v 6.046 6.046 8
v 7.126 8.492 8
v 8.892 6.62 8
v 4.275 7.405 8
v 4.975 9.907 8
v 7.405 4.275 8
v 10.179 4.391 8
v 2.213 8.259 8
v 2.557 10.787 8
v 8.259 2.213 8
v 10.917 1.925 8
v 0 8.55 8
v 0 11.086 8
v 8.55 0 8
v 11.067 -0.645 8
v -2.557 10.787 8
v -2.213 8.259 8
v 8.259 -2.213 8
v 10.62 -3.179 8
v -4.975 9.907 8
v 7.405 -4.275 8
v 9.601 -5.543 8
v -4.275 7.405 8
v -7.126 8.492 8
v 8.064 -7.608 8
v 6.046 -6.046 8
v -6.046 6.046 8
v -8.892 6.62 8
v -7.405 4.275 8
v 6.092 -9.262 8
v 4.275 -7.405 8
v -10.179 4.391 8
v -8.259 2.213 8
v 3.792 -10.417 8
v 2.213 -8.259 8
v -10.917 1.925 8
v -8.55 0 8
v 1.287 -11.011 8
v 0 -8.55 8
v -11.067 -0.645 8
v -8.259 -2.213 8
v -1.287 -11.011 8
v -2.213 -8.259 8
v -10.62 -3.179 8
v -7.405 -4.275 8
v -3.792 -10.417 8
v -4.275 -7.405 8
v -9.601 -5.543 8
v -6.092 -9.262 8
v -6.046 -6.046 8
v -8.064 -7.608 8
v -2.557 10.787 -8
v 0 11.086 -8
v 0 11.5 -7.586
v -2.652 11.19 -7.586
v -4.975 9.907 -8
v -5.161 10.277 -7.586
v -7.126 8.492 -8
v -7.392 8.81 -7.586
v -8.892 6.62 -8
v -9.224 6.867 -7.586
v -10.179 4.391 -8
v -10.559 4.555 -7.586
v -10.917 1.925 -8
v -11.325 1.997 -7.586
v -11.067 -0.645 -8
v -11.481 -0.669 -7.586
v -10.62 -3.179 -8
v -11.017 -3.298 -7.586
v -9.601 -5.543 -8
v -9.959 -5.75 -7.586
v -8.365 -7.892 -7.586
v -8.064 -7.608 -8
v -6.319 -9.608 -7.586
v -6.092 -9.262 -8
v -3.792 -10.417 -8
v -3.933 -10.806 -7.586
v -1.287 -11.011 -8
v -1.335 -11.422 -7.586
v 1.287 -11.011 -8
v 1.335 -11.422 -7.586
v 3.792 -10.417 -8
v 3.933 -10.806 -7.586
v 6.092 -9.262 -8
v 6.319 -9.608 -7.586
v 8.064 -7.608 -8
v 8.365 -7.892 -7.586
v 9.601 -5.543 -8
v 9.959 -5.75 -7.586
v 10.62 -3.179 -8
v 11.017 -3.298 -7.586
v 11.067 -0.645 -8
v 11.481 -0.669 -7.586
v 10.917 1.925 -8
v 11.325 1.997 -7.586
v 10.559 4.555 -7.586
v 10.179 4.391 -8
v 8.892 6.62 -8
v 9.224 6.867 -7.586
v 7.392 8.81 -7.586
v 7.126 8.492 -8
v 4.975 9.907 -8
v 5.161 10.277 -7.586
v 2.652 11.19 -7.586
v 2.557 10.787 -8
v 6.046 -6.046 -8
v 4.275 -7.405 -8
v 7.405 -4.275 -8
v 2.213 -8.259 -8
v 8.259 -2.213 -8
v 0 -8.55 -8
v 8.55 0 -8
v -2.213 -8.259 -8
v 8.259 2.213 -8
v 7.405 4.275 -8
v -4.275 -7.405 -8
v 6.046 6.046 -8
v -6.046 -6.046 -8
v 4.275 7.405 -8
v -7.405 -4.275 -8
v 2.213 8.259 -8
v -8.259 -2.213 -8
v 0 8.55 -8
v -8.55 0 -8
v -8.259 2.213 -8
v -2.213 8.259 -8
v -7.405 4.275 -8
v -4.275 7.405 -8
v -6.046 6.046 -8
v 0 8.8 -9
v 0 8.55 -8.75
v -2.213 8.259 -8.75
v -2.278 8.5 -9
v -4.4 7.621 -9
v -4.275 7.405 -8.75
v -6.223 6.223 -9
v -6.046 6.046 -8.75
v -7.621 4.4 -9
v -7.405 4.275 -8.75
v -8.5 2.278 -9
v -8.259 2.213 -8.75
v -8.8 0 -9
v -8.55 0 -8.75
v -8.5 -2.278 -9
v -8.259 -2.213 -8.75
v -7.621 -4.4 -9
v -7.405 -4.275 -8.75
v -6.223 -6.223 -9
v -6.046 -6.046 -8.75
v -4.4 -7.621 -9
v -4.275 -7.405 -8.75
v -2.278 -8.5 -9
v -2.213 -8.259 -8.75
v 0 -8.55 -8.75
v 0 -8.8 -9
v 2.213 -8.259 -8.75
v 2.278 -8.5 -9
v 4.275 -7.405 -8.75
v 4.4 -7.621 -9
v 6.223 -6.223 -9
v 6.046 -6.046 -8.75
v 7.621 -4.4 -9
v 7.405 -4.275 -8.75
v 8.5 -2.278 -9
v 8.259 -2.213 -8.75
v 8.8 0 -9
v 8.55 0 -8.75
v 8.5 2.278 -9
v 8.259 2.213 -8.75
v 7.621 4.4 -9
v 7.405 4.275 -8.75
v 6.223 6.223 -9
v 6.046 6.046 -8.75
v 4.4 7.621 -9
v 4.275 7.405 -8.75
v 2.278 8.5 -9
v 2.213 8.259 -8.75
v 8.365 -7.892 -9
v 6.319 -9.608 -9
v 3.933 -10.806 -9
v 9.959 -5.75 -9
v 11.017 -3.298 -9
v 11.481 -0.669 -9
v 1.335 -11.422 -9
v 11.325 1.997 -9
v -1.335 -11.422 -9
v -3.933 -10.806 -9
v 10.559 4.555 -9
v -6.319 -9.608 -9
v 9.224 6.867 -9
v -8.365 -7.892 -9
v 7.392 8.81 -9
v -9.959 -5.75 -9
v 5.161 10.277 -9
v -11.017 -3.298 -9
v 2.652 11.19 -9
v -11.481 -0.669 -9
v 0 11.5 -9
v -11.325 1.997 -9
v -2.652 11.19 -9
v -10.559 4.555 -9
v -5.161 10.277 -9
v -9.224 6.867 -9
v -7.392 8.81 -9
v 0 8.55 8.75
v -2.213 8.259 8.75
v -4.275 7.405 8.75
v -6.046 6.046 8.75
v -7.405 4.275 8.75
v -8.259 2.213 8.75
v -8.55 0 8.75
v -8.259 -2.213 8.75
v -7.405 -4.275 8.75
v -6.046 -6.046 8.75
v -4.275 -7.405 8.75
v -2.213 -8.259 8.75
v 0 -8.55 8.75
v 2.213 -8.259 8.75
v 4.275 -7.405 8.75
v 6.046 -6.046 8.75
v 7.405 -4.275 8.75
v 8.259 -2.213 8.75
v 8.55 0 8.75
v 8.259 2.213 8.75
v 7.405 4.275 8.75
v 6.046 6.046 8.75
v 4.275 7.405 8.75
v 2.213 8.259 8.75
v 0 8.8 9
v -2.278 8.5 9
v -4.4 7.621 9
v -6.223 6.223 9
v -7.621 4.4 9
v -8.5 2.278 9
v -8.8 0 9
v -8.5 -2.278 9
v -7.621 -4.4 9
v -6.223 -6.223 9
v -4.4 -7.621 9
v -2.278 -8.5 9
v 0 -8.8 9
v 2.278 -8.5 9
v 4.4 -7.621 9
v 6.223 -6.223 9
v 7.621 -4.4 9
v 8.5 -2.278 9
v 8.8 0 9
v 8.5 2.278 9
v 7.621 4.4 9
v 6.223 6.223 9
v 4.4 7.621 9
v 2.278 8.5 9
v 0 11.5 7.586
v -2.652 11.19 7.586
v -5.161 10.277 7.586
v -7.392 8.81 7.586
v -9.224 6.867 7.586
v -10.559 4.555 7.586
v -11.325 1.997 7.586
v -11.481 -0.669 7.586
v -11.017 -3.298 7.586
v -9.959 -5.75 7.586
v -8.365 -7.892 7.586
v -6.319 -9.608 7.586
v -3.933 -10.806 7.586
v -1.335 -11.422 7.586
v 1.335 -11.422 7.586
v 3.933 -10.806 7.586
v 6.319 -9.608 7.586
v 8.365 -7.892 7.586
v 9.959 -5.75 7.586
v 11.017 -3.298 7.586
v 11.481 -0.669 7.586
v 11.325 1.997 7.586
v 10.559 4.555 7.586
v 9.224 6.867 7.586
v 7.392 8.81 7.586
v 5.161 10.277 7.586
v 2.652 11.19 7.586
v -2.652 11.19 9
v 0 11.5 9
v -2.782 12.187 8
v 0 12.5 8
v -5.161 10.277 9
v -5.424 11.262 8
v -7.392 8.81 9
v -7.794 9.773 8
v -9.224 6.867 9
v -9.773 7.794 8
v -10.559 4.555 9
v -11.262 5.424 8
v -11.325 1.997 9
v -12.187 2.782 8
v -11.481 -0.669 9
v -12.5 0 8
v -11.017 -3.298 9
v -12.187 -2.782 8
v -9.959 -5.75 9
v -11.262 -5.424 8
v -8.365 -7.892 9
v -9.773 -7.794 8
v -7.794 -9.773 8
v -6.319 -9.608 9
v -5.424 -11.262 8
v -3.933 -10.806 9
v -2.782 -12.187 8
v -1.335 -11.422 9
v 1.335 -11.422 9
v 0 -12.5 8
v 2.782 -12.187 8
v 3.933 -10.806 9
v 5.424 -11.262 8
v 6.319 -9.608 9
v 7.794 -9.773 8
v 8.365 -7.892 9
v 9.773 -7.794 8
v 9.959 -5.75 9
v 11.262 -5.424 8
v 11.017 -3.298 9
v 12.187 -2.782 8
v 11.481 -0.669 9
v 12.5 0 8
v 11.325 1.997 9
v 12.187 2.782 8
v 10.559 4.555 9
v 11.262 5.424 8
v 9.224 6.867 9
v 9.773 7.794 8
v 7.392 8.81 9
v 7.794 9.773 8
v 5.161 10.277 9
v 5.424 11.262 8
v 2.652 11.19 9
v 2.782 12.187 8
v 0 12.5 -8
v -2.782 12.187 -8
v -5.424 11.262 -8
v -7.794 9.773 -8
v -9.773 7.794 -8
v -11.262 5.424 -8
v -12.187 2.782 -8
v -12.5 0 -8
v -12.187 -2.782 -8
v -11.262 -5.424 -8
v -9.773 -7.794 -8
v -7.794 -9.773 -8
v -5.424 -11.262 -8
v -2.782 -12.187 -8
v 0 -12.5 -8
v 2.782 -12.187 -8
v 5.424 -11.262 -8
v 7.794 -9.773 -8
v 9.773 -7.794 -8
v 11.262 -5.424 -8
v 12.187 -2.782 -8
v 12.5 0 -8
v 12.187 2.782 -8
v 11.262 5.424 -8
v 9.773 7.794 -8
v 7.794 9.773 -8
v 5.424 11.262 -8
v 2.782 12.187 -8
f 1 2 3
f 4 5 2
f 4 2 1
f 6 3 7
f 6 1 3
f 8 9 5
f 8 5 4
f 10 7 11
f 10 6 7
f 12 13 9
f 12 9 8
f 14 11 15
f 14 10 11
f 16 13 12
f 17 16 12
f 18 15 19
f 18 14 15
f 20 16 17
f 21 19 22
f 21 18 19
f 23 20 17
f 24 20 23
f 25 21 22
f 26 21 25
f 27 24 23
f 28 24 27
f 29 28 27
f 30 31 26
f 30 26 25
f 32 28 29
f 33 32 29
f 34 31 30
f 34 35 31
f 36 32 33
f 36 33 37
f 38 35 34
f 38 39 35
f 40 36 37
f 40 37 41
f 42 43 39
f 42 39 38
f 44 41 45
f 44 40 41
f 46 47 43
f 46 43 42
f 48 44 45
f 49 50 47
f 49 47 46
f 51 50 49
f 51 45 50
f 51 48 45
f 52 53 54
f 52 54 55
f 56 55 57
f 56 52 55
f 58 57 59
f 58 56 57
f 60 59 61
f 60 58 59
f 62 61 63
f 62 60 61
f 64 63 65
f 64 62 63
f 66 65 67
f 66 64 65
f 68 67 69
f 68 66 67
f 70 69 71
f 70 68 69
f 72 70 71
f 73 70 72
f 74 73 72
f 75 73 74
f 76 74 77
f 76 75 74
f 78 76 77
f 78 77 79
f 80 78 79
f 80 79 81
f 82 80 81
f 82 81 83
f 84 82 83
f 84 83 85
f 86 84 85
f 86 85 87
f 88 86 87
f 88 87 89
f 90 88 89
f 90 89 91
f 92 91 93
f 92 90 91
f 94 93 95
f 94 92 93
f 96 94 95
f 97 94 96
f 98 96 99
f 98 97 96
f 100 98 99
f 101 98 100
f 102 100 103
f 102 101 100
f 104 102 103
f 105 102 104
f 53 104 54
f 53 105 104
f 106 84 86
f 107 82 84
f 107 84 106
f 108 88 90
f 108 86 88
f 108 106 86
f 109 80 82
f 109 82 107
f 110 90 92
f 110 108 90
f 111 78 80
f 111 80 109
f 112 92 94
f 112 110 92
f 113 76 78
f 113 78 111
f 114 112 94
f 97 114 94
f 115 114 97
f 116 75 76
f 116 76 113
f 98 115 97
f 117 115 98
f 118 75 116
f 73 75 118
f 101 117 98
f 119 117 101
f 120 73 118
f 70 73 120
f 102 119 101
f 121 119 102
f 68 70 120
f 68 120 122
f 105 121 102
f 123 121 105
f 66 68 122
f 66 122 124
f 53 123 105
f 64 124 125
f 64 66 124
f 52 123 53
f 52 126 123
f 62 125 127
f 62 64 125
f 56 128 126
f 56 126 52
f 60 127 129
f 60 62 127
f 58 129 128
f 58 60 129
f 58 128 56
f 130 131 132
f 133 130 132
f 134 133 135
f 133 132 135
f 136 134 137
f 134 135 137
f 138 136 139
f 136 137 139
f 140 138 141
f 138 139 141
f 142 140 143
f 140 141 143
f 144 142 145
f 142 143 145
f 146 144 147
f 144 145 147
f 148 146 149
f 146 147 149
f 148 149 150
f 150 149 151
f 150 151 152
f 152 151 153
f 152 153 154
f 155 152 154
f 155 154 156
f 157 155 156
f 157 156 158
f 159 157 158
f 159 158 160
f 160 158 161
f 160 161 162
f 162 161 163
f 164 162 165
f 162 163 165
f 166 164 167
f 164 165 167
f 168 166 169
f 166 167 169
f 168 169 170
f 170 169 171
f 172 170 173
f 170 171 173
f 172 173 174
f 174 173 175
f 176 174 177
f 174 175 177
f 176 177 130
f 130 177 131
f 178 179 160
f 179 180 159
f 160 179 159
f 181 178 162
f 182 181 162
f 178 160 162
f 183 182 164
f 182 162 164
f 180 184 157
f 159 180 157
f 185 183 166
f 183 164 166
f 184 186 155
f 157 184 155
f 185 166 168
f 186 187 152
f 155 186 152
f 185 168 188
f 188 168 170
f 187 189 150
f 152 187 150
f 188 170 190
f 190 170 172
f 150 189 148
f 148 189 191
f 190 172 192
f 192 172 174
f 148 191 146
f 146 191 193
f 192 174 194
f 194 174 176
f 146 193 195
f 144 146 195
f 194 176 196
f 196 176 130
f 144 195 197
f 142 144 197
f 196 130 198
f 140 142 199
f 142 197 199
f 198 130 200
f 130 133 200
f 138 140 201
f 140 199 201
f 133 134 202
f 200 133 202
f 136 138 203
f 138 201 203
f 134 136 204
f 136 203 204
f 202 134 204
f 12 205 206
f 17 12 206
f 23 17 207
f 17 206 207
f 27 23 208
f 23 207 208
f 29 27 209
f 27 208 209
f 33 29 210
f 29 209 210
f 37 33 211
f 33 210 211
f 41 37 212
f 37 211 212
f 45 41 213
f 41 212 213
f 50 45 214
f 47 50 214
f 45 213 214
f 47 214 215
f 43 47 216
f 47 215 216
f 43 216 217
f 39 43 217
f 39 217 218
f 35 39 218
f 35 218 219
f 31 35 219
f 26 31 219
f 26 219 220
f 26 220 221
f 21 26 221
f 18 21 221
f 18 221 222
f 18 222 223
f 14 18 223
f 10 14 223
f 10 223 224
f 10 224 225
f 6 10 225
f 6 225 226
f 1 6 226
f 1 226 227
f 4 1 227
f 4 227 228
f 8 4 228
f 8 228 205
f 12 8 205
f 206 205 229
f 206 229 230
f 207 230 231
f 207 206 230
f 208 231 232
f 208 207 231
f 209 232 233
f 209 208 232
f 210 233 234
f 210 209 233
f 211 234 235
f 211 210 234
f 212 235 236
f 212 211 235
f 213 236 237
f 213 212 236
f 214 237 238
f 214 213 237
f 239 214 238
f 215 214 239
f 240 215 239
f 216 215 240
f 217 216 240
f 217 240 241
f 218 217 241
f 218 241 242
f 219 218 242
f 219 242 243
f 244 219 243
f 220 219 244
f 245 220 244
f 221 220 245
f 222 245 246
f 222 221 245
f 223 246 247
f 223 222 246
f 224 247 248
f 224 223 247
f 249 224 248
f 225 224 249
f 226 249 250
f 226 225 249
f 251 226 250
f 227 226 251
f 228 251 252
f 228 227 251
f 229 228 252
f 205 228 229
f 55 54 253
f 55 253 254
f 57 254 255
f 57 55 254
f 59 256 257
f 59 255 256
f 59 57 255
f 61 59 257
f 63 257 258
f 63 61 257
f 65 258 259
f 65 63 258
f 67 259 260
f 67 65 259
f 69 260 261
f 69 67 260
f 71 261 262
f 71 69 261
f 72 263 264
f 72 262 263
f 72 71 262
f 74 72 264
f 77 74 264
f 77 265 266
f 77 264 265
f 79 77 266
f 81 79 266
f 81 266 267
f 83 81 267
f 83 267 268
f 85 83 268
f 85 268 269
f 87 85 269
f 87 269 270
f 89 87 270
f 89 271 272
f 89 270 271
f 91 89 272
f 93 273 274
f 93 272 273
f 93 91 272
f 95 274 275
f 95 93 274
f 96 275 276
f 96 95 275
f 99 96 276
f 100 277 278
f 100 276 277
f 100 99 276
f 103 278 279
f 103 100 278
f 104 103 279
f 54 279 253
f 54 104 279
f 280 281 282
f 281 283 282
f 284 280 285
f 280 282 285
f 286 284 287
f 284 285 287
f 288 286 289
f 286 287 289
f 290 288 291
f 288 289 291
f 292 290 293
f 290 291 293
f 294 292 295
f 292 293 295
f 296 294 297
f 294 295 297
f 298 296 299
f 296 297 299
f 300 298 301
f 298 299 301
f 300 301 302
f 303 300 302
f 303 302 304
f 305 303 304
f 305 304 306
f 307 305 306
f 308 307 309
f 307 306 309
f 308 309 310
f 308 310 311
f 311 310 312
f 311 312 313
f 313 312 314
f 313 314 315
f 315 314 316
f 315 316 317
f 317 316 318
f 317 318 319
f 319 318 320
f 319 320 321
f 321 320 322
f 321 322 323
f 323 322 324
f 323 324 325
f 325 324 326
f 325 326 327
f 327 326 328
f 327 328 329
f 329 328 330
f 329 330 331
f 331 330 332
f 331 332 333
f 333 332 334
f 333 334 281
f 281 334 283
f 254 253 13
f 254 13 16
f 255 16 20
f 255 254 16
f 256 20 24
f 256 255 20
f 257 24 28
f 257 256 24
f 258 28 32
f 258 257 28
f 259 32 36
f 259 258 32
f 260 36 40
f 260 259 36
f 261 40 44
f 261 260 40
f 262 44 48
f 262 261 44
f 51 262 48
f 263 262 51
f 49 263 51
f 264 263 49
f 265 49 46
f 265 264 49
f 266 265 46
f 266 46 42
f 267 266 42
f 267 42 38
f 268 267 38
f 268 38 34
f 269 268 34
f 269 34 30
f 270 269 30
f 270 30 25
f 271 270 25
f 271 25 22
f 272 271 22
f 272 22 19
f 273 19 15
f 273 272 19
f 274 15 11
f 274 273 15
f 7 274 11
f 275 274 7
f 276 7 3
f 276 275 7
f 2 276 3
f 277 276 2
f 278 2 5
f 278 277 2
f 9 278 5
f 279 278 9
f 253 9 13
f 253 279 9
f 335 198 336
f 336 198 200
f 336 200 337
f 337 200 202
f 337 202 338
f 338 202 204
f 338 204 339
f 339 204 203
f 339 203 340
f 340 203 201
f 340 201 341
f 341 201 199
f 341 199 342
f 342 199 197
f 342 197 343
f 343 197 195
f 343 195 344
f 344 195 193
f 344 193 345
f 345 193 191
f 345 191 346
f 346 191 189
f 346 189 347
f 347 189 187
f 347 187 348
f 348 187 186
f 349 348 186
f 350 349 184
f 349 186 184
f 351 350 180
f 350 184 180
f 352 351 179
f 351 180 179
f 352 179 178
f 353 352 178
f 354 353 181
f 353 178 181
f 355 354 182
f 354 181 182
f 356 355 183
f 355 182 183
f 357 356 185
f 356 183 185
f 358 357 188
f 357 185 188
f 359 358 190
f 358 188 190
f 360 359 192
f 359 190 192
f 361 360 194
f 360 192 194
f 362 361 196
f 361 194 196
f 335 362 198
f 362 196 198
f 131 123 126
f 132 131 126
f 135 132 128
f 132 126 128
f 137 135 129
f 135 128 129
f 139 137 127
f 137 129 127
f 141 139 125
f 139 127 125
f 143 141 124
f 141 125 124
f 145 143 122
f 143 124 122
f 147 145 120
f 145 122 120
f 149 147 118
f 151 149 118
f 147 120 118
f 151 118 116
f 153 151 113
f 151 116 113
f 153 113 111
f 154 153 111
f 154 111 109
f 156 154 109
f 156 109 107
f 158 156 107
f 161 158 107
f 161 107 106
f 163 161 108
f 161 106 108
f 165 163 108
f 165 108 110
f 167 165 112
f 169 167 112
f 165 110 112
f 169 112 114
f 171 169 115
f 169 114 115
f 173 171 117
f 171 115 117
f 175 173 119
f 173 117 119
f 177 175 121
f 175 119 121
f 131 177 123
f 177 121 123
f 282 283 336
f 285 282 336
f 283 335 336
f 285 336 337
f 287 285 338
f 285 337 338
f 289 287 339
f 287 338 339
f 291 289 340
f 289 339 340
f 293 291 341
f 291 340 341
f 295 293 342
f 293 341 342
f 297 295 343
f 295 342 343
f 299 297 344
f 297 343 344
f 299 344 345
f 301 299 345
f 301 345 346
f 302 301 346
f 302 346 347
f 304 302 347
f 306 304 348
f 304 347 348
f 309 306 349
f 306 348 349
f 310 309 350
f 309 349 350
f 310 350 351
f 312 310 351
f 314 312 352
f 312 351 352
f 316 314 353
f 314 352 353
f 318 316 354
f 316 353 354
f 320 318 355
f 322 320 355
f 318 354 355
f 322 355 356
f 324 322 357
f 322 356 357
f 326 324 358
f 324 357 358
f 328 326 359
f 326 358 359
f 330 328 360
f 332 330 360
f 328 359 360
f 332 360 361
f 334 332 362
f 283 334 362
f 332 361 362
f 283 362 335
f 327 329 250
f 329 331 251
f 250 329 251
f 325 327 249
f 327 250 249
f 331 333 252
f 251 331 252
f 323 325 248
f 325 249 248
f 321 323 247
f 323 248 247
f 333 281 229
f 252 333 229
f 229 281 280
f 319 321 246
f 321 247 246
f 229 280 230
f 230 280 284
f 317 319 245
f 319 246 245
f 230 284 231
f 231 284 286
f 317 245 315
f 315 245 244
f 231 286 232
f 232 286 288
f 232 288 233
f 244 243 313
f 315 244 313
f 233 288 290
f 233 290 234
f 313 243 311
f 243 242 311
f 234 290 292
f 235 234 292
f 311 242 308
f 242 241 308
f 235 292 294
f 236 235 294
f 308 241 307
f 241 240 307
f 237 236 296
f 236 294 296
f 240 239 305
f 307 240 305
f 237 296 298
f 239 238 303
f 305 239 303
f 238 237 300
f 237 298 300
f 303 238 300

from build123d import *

# Parameters (mm, degrees)
SPESSORE1_T1 = 1
SMUSSO1_SIZE = 0.25


with BuildPart() as body_1:
    # Superficie-Rivoluzione1: a surface, the sketch's curves turned about an axis
    with BuildLine(Plane(origin=(0, 0, 0), x_dir=(0, 0, -1), z_dir=(1, 0, 0)), mode=Mode.PRIVATE) as superficie_rivoluzione1_1_path:
        Line((-9, 8.55), (-9, 11.5))
        Line((-9, 11.5), (-8, 12.5))
        Line((-8, 12.5), (8, 12.5))
        Line((8, 12.5), (9, 11.5))
        Line((9, 11.5), (9, 8.55))
    superficie_rivoluzione1_1 = Shell.revolve(superficie_rivoluzione1_1_path.wire(), 360, Axis((0, 0, 0), (0, 0, 1)))
    add(Solid.thicken(superficie_rivoluzione1_1, SPESSORE1_T1))

    # Smusso1
    smusso1_edges = [body_1.edges().sort_by_distance(p)[0] for p in [
        (0, -8.55, -9),
        (0, -8.55, 9),
    ]]
    chamfer(smusso1_edges, length=SMUSSO1_SIZE)


solid = body_1.part
